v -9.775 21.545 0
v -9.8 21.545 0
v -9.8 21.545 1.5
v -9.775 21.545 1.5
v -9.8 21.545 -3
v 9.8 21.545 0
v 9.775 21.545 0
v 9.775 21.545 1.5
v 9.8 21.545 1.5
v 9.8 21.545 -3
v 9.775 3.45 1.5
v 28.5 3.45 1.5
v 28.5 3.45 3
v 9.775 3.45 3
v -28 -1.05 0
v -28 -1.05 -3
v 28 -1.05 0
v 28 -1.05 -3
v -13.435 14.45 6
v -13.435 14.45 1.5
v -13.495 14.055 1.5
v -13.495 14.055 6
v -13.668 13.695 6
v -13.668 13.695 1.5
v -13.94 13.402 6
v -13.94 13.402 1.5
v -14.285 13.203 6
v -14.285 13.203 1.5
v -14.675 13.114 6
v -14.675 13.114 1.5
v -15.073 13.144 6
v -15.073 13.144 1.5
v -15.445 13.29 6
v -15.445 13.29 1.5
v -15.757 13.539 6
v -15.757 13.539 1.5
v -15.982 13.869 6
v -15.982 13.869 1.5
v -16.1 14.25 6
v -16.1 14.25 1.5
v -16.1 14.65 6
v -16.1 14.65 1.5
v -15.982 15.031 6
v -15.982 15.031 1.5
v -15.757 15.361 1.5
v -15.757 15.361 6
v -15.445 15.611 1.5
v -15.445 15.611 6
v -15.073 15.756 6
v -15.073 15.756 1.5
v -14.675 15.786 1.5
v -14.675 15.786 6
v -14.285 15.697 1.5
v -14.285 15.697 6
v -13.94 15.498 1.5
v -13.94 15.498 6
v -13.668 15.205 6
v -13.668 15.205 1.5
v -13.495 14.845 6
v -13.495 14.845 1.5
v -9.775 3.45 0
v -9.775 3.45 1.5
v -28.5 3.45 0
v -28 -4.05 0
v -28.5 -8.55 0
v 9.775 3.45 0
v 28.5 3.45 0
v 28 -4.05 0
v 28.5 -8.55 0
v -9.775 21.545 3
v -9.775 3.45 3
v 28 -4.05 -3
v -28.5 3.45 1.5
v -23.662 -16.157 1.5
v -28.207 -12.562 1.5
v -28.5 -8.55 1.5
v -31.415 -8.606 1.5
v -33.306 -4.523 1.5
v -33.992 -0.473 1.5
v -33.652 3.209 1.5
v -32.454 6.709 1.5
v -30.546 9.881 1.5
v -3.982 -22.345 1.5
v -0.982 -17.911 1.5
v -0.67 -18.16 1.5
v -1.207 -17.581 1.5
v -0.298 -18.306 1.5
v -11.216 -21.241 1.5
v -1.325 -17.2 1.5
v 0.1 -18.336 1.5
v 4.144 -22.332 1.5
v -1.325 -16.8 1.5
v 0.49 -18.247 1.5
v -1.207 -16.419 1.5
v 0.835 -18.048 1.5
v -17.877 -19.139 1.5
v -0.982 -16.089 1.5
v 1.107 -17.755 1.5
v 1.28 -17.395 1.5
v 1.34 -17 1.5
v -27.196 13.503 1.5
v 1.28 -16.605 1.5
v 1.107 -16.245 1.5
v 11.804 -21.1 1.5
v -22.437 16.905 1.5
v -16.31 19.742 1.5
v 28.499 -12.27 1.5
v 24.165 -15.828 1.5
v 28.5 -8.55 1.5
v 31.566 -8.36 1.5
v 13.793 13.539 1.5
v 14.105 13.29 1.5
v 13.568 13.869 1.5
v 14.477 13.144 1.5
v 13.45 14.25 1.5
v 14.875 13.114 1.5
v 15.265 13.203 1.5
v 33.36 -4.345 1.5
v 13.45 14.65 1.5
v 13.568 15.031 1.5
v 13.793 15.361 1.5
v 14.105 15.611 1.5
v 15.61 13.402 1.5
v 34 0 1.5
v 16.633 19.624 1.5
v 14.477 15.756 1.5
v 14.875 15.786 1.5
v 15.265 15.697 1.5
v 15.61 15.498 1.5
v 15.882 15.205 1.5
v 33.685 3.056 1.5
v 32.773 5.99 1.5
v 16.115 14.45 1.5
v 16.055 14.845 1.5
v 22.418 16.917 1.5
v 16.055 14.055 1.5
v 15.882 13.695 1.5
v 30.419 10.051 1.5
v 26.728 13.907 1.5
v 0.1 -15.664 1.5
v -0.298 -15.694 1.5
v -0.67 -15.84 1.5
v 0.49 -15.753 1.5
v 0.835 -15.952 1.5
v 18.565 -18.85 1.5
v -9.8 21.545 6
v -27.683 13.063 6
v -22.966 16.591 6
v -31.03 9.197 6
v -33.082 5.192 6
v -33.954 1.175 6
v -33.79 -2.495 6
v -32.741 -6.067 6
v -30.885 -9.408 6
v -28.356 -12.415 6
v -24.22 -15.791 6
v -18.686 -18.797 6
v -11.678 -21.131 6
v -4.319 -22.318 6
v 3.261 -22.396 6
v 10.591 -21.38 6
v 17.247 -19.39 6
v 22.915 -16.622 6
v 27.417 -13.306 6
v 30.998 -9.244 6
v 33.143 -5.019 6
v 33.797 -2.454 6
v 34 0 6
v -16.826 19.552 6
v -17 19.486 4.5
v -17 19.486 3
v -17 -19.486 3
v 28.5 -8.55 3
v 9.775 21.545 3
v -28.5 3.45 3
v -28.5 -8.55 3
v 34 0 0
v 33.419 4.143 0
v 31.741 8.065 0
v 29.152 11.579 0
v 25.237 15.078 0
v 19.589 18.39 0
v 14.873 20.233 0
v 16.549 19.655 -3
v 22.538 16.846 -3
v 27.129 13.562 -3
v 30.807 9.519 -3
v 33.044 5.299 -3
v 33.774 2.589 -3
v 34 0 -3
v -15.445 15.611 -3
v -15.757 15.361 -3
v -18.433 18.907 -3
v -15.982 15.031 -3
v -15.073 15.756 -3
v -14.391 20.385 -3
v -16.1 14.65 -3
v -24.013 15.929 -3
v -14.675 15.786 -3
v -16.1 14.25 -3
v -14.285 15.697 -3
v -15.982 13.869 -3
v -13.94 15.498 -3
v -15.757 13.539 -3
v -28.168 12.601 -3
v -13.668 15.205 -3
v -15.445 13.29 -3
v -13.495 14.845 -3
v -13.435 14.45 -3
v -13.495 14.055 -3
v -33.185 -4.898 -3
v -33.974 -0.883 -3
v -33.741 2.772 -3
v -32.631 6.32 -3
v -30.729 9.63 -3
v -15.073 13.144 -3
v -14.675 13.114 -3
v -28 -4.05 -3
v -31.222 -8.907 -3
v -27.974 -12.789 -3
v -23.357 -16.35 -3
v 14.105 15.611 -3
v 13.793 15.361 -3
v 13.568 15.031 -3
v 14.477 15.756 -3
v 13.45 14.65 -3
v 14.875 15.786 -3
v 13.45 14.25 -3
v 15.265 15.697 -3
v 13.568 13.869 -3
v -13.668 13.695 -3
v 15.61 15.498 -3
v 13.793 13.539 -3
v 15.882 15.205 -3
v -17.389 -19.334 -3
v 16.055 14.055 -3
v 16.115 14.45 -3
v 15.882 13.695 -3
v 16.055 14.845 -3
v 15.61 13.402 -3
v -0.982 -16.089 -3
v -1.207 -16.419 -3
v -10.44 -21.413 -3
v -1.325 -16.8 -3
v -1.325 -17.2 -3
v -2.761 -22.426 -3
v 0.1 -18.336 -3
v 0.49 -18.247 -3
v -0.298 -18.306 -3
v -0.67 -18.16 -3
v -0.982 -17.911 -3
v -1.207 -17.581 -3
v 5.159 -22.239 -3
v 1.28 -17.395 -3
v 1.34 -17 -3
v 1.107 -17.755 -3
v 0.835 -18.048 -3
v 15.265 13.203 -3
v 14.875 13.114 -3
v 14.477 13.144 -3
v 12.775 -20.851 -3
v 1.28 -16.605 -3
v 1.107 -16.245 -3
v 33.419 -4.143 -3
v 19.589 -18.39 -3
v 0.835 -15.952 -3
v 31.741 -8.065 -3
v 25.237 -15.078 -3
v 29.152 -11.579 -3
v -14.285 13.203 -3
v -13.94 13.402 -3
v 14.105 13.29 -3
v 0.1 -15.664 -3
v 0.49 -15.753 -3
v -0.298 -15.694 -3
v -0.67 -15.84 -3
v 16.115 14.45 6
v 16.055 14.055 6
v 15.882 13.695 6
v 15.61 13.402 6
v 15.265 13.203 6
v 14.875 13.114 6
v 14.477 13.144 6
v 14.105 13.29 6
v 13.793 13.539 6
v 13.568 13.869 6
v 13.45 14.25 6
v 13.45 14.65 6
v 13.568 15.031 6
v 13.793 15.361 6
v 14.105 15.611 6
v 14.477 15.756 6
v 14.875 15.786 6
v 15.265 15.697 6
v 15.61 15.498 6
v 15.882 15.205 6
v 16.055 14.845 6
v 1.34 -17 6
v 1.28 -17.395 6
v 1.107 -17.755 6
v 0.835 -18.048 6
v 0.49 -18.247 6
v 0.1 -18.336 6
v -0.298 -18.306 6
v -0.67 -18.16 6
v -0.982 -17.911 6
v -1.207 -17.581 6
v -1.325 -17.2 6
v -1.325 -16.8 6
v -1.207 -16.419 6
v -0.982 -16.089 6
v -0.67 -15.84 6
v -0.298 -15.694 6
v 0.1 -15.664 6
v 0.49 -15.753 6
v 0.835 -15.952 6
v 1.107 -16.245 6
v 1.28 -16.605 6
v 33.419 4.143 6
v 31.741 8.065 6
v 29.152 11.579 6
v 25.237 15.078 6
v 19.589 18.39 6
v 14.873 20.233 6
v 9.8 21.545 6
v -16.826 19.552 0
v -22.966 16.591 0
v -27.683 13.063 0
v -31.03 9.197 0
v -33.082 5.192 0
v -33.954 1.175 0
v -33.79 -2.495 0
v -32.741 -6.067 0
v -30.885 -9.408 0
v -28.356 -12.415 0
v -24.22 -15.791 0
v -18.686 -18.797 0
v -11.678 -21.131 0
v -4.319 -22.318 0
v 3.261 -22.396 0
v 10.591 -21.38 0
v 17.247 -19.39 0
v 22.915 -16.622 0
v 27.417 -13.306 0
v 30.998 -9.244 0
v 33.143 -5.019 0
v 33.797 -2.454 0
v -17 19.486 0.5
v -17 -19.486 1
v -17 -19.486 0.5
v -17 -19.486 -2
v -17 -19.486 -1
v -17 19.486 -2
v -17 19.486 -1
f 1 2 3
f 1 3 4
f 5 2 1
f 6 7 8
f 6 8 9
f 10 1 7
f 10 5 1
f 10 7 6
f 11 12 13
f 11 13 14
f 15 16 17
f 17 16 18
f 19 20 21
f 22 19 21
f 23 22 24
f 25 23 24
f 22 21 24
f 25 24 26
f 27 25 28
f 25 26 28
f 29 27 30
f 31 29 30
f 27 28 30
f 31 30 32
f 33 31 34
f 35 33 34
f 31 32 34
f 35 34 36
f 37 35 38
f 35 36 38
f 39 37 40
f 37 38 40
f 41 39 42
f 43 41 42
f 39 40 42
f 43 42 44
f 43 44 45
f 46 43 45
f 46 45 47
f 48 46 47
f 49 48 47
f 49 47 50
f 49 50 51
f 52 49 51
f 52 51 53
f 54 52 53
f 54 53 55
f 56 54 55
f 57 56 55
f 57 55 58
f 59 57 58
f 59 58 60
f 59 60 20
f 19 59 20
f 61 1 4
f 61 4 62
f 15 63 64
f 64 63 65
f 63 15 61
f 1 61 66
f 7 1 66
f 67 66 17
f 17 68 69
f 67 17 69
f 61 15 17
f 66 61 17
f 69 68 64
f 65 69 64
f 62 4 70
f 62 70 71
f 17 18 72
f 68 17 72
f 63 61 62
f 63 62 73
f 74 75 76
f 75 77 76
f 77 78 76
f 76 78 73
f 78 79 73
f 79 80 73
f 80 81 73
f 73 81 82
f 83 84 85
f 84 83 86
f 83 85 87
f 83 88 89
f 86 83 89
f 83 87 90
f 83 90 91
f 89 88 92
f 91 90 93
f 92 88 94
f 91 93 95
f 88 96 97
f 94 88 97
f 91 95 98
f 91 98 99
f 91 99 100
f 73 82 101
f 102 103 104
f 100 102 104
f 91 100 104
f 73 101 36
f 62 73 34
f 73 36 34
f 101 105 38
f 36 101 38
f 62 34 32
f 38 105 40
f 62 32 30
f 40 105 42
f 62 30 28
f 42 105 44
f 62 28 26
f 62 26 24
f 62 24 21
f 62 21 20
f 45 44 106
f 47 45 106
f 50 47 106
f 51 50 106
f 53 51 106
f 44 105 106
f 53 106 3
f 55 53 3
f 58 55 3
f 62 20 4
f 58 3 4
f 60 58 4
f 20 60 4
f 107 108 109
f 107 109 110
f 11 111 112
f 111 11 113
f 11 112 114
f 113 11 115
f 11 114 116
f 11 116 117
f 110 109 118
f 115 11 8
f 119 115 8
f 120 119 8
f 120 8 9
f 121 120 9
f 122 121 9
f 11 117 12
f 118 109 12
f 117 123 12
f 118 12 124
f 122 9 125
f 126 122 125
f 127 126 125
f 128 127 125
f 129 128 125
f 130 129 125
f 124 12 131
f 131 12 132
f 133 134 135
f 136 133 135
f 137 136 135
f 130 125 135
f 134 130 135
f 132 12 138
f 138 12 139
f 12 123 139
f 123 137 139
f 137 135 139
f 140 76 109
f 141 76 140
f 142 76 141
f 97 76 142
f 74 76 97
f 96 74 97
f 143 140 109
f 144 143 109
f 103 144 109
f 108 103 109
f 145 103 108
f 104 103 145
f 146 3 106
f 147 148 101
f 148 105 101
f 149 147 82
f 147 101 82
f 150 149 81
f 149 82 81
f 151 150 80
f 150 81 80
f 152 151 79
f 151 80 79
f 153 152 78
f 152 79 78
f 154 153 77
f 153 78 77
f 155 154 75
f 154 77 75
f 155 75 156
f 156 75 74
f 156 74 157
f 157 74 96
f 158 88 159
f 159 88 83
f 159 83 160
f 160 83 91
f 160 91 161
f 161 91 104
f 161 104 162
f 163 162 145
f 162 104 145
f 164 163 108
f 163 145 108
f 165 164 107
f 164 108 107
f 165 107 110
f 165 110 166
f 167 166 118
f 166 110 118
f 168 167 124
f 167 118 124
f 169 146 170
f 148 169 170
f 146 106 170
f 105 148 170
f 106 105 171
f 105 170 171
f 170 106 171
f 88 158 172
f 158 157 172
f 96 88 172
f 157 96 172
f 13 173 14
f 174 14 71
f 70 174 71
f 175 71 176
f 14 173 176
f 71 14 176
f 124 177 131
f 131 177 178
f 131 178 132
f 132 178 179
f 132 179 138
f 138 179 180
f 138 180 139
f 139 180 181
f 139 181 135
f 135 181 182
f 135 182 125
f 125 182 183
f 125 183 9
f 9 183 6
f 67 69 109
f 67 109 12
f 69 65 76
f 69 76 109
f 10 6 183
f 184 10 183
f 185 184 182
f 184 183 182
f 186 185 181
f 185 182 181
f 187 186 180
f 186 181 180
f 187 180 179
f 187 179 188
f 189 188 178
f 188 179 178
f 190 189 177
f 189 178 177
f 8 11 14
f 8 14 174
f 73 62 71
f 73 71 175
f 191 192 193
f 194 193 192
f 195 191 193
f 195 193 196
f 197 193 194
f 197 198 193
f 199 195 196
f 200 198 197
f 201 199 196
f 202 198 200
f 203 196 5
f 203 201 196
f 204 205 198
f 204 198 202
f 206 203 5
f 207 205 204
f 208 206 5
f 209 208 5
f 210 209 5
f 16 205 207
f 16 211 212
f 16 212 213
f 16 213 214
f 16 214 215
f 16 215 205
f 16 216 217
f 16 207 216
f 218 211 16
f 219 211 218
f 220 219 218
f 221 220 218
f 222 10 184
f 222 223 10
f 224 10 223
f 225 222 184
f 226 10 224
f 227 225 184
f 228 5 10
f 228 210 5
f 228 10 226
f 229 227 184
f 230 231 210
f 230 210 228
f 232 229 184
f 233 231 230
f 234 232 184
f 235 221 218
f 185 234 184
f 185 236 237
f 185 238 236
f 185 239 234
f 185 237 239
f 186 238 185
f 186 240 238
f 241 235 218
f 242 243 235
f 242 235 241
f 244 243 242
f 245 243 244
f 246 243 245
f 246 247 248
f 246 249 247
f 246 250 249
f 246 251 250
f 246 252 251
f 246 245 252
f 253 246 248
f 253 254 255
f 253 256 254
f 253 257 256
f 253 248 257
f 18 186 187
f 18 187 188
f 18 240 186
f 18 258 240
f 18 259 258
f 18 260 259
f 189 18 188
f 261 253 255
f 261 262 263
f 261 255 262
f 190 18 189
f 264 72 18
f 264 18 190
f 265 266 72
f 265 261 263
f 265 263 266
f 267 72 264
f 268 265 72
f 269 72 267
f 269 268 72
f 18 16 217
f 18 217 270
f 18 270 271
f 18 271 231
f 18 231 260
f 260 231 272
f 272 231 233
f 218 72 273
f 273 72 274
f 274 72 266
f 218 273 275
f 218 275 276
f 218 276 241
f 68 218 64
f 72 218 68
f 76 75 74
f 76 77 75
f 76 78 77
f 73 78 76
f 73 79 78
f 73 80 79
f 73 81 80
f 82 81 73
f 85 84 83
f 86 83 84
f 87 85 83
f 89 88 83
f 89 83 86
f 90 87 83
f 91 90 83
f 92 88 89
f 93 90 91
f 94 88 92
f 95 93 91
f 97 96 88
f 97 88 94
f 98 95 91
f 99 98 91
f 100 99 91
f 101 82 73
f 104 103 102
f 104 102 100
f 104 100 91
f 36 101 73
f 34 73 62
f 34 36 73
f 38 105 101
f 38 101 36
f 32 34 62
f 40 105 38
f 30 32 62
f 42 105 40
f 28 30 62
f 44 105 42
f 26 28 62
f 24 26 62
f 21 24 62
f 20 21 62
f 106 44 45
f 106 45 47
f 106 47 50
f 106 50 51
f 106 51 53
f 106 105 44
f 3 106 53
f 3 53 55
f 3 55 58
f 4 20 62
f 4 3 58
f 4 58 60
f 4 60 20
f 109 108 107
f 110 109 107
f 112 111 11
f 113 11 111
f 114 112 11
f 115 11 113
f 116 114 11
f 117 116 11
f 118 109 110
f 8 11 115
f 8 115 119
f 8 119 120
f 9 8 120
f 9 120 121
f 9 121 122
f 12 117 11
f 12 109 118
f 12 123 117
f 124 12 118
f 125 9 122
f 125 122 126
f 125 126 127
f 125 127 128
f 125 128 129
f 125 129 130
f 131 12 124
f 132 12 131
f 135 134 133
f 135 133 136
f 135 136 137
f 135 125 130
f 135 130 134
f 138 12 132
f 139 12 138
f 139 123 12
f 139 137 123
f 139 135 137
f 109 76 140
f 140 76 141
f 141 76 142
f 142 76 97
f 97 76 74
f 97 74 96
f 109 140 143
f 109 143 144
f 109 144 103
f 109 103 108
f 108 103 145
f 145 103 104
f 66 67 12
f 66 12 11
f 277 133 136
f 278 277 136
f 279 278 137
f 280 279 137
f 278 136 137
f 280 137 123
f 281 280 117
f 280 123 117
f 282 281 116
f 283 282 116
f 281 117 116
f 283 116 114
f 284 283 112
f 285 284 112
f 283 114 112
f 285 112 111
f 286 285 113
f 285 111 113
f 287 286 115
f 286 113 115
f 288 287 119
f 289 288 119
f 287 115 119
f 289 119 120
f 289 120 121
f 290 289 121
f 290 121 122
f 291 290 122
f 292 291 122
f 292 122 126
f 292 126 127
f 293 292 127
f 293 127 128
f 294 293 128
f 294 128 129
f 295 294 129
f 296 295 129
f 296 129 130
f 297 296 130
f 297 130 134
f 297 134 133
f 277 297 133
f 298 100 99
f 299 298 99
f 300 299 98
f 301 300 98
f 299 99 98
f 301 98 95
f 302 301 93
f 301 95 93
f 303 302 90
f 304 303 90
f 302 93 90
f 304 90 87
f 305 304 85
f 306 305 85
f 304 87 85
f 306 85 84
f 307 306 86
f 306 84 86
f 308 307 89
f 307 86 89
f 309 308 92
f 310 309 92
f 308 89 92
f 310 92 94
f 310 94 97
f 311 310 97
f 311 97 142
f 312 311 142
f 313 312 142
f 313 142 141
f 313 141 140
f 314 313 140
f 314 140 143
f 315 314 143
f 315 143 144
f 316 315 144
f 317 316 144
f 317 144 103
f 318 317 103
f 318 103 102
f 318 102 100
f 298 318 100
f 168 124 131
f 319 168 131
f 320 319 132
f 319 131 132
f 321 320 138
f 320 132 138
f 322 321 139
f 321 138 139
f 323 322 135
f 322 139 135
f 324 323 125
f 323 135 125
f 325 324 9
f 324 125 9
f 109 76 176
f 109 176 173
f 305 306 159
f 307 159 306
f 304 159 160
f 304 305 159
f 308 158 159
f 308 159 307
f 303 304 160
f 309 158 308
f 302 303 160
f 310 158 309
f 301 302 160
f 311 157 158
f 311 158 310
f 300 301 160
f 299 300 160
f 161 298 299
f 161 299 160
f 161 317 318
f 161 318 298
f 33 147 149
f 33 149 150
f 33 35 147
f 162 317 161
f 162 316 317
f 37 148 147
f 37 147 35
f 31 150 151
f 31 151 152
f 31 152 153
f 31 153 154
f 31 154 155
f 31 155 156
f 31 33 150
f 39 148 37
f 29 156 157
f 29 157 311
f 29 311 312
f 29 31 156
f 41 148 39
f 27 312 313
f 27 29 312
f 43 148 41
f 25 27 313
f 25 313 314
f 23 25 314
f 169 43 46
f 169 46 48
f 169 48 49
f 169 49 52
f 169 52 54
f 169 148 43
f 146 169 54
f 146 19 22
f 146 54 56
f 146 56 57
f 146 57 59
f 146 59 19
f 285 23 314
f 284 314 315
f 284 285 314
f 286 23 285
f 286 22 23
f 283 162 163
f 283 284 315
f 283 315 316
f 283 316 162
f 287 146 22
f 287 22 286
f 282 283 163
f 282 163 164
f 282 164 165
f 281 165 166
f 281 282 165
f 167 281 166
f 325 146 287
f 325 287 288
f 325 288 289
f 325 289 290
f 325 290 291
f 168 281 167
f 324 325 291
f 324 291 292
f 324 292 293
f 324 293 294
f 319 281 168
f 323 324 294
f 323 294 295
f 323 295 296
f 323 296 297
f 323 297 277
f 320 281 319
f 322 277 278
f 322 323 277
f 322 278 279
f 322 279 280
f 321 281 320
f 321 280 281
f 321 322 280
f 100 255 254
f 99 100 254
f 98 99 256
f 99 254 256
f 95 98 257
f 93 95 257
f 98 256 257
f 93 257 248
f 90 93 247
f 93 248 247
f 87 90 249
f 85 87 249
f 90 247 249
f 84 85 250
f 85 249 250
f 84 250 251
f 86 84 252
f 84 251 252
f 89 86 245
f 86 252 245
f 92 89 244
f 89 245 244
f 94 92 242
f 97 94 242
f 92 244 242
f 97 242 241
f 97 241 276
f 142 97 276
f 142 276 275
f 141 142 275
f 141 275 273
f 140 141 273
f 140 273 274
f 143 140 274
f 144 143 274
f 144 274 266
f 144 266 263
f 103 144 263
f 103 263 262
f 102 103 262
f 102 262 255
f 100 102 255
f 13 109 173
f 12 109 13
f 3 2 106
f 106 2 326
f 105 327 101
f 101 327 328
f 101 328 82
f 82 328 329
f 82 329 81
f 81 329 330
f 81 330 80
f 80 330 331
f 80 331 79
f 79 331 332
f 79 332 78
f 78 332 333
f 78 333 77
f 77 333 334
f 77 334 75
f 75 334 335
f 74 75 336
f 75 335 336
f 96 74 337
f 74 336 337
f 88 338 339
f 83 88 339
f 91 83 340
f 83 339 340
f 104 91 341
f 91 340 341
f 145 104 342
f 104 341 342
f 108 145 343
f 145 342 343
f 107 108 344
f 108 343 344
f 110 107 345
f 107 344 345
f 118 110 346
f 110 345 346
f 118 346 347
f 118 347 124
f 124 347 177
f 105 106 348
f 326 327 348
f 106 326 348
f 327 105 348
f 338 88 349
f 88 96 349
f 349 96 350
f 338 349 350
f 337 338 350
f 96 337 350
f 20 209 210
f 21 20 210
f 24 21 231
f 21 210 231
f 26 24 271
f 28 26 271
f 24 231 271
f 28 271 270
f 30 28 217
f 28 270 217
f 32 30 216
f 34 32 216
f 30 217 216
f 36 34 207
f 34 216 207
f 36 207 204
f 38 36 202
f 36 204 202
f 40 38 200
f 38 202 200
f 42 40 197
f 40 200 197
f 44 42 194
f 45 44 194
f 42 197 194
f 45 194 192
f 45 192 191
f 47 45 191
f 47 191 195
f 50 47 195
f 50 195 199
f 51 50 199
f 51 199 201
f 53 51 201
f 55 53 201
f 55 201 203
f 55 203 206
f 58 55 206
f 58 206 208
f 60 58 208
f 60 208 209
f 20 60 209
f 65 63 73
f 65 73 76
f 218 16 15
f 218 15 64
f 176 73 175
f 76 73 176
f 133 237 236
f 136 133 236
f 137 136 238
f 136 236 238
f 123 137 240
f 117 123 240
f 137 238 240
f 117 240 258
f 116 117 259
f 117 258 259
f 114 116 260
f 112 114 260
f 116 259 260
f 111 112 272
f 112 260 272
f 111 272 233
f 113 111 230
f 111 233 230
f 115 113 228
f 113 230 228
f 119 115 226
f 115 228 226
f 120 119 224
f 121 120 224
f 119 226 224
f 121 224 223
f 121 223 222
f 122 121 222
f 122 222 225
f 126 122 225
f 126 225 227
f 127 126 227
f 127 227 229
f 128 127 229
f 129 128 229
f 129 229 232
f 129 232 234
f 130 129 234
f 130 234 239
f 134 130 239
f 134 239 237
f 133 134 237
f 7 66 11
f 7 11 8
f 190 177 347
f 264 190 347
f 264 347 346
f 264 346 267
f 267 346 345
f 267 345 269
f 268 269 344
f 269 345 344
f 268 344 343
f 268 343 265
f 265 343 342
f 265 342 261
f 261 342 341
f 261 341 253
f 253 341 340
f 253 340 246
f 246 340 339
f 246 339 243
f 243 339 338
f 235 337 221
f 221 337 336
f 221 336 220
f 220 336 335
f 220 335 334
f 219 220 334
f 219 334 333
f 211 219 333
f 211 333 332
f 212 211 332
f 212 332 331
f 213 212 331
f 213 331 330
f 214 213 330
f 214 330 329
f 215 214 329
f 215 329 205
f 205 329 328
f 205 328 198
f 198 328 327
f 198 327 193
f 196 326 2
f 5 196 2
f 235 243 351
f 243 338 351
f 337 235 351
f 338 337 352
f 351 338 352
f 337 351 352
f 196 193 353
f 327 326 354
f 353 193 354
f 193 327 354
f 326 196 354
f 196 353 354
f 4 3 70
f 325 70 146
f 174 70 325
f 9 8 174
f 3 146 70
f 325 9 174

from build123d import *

# Parameters (mm, degrees)
BOX_BOTTOM_HALF_0_W     = 69.994952
BOX_BOTTOM_HALF_0_H     = 46.031044
BOX_BOTTOM_HALF_0_DEPTH = 5.5
PAD_DEPTH               = 6
POCKET_DEPTH            = 3
PAD001_DEPTH            = 3
SKETCH003_W             = 56
SKETCH003_H             = 3
POCKET001_DEPTH         = 3
SKETCH004_W             = 19.6
SKETCH004_H             = 1
POCKET002_DEPTH         = 9.001
SKETCH005_R             = 1.34
POCKET003_DEPTH         = 9.001


with BuildPart() as box_bottom_half_0_body:
    # box_bottom_half_0 → box_bottom_half_0 (new body)
    with BuildSketch(Plane(origin=(-34.994952, -23.485952, -4), x_dir=(1, 0, 0), z_dir=(0, 0, 1))):
        with Locations((34.997476, 23.015522)):
            Rectangle(BOX_BOTTOM_HALF_0_W, BOX_BOTTOM_HALF_0_H)
    extrude(amount=BOX_BOTTOM_HALF_0_DEPTH)


with BuildPart() as body:
    # Sketch → Pad (new body)
    with BuildSketch(Plane.XY):
        with BuildLine():
            add(Edge.make_bspline(
                [(34, 0), (34, 38.971143), (-17, 19.485572), (-68, 0), (-17, -19.485572), (34, -38.971143), (34, 0)],
                knots=[0, 0, 0, 2.094395, 2.094395, 4.18879, 4.18879, 6.283185, 6.283185, 6.283185], degree=2, weights=[1, 0.5, 1, 0.5, 1, 0.5, 1]))
        make_face()
    extrude(amount=PAD_DEPTH)

    # Sketch001 (on Face2 of Pad) → Pocket (cut)
    with BuildSketch(Plane(origin=(0, 0, 0), x_dir=(1, 0, 0), z_dir=(0, 0, -1))):
        Polygon((9.775, -3.450064), (9.775, -21.550064), (-9.775, -21.550064), (-9.775, -3.450064), (-28.5, -3.450064), (-28.5, 8.549936), (28.5, 8.549936), (28.5, -3.450064), align=None)
    extrude(amount=-POCKET_DEPTH, mode=Mode.SUBTRACT)

    # Sketch002 (on Face2 of Pocket) → Pad001 (join)
    with BuildSketch(Plane(origin=(0, 0, 0), x_dir=(1, 0, 0), z_dir=(0, 0, -1))):
        with BuildLine():
            add(Edge.make_bspline(
                [(34, 0), (34, 38.971143), (-17, 19.485572), (-68, 0), (-17, -19.485572), (34, -38.971143), (34, 0)],
                knots=[0, 0, 0, 2.094395, 2.094395, 4.18879, 4.18879, 6.283185, 6.283185, 6.283185], degree=2, weights=[1, 0.5, 1, 0.5, 1, 0.5, 1]))
        make_face()
    extrude(amount=PAD001_DEPTH)

    # Sketch003 (on Face4 of Pad001) → Pocket001 (cut)
    with BuildSketch(Plane(origin=(0, 0, -3), x_dir=(1, 0, 0), z_dir=(0, 0, -1))):
        with Locations((0, 2.549936)):
            Rectangle(SKETCH003_W, SKETCH003_H)
    extrude(amount=-POCKET001_DEPTH, mode=Mode.SUBTRACT)

    # Sketch004 (on Face4 of Pocket001) → Pocket002 (cut, through all)
    with BuildSketch(Plane(origin=(0, 0, -3), x_dir=(1, 0, 0), z_dir=(0, 0, -1))):
        with Locations((0, -22.045091)):
            Rectangle(SKETCH004_W, SKETCH004_H)
    extrude(amount=-POCKET002_DEPTH, mode=Mode.SUBTRACT)

    # Sketch005 (on Face7 of Pocket002) → Pocket003 (cut, through all)
    with BuildSketch(Plane(origin=(0, 0, -3), x_dir=(1, 0, 0), z_dir=(0, 0, -1))):
        with Locations((-14.775, -14.450064)):
            Circle(SKETCH005_R)
        with Locations((0, 17)):
            Circle(SKETCH005_R)
        with Locations((14.775, -14.450064)):
            Circle(SKETCH005_R)
    extrude(amount=-POCKET003_DEPTH, mode=Mode.SUBTRACT)


with BuildPart() as bottom_half_0_body:
    # bottom_half_0 base: copy of Body
    add(body.part)

    # bottom_half_0: intersect box_bottom_half_0 body
    add(box_bottom_half_0_body.part, mode=Mode.INTERSECT)


with BuildPart() as top_half_0_body:
    # top_half_0 base: copy of Body
    add(body.part)

    # top_half_0: cut box_bottom_half_0 body
    add(box_bottom_half_0_body.part, mode=Mode.SUBTRACT)


solid = Compound([bottom_half_0_body.part, top_half_0_body.part])
